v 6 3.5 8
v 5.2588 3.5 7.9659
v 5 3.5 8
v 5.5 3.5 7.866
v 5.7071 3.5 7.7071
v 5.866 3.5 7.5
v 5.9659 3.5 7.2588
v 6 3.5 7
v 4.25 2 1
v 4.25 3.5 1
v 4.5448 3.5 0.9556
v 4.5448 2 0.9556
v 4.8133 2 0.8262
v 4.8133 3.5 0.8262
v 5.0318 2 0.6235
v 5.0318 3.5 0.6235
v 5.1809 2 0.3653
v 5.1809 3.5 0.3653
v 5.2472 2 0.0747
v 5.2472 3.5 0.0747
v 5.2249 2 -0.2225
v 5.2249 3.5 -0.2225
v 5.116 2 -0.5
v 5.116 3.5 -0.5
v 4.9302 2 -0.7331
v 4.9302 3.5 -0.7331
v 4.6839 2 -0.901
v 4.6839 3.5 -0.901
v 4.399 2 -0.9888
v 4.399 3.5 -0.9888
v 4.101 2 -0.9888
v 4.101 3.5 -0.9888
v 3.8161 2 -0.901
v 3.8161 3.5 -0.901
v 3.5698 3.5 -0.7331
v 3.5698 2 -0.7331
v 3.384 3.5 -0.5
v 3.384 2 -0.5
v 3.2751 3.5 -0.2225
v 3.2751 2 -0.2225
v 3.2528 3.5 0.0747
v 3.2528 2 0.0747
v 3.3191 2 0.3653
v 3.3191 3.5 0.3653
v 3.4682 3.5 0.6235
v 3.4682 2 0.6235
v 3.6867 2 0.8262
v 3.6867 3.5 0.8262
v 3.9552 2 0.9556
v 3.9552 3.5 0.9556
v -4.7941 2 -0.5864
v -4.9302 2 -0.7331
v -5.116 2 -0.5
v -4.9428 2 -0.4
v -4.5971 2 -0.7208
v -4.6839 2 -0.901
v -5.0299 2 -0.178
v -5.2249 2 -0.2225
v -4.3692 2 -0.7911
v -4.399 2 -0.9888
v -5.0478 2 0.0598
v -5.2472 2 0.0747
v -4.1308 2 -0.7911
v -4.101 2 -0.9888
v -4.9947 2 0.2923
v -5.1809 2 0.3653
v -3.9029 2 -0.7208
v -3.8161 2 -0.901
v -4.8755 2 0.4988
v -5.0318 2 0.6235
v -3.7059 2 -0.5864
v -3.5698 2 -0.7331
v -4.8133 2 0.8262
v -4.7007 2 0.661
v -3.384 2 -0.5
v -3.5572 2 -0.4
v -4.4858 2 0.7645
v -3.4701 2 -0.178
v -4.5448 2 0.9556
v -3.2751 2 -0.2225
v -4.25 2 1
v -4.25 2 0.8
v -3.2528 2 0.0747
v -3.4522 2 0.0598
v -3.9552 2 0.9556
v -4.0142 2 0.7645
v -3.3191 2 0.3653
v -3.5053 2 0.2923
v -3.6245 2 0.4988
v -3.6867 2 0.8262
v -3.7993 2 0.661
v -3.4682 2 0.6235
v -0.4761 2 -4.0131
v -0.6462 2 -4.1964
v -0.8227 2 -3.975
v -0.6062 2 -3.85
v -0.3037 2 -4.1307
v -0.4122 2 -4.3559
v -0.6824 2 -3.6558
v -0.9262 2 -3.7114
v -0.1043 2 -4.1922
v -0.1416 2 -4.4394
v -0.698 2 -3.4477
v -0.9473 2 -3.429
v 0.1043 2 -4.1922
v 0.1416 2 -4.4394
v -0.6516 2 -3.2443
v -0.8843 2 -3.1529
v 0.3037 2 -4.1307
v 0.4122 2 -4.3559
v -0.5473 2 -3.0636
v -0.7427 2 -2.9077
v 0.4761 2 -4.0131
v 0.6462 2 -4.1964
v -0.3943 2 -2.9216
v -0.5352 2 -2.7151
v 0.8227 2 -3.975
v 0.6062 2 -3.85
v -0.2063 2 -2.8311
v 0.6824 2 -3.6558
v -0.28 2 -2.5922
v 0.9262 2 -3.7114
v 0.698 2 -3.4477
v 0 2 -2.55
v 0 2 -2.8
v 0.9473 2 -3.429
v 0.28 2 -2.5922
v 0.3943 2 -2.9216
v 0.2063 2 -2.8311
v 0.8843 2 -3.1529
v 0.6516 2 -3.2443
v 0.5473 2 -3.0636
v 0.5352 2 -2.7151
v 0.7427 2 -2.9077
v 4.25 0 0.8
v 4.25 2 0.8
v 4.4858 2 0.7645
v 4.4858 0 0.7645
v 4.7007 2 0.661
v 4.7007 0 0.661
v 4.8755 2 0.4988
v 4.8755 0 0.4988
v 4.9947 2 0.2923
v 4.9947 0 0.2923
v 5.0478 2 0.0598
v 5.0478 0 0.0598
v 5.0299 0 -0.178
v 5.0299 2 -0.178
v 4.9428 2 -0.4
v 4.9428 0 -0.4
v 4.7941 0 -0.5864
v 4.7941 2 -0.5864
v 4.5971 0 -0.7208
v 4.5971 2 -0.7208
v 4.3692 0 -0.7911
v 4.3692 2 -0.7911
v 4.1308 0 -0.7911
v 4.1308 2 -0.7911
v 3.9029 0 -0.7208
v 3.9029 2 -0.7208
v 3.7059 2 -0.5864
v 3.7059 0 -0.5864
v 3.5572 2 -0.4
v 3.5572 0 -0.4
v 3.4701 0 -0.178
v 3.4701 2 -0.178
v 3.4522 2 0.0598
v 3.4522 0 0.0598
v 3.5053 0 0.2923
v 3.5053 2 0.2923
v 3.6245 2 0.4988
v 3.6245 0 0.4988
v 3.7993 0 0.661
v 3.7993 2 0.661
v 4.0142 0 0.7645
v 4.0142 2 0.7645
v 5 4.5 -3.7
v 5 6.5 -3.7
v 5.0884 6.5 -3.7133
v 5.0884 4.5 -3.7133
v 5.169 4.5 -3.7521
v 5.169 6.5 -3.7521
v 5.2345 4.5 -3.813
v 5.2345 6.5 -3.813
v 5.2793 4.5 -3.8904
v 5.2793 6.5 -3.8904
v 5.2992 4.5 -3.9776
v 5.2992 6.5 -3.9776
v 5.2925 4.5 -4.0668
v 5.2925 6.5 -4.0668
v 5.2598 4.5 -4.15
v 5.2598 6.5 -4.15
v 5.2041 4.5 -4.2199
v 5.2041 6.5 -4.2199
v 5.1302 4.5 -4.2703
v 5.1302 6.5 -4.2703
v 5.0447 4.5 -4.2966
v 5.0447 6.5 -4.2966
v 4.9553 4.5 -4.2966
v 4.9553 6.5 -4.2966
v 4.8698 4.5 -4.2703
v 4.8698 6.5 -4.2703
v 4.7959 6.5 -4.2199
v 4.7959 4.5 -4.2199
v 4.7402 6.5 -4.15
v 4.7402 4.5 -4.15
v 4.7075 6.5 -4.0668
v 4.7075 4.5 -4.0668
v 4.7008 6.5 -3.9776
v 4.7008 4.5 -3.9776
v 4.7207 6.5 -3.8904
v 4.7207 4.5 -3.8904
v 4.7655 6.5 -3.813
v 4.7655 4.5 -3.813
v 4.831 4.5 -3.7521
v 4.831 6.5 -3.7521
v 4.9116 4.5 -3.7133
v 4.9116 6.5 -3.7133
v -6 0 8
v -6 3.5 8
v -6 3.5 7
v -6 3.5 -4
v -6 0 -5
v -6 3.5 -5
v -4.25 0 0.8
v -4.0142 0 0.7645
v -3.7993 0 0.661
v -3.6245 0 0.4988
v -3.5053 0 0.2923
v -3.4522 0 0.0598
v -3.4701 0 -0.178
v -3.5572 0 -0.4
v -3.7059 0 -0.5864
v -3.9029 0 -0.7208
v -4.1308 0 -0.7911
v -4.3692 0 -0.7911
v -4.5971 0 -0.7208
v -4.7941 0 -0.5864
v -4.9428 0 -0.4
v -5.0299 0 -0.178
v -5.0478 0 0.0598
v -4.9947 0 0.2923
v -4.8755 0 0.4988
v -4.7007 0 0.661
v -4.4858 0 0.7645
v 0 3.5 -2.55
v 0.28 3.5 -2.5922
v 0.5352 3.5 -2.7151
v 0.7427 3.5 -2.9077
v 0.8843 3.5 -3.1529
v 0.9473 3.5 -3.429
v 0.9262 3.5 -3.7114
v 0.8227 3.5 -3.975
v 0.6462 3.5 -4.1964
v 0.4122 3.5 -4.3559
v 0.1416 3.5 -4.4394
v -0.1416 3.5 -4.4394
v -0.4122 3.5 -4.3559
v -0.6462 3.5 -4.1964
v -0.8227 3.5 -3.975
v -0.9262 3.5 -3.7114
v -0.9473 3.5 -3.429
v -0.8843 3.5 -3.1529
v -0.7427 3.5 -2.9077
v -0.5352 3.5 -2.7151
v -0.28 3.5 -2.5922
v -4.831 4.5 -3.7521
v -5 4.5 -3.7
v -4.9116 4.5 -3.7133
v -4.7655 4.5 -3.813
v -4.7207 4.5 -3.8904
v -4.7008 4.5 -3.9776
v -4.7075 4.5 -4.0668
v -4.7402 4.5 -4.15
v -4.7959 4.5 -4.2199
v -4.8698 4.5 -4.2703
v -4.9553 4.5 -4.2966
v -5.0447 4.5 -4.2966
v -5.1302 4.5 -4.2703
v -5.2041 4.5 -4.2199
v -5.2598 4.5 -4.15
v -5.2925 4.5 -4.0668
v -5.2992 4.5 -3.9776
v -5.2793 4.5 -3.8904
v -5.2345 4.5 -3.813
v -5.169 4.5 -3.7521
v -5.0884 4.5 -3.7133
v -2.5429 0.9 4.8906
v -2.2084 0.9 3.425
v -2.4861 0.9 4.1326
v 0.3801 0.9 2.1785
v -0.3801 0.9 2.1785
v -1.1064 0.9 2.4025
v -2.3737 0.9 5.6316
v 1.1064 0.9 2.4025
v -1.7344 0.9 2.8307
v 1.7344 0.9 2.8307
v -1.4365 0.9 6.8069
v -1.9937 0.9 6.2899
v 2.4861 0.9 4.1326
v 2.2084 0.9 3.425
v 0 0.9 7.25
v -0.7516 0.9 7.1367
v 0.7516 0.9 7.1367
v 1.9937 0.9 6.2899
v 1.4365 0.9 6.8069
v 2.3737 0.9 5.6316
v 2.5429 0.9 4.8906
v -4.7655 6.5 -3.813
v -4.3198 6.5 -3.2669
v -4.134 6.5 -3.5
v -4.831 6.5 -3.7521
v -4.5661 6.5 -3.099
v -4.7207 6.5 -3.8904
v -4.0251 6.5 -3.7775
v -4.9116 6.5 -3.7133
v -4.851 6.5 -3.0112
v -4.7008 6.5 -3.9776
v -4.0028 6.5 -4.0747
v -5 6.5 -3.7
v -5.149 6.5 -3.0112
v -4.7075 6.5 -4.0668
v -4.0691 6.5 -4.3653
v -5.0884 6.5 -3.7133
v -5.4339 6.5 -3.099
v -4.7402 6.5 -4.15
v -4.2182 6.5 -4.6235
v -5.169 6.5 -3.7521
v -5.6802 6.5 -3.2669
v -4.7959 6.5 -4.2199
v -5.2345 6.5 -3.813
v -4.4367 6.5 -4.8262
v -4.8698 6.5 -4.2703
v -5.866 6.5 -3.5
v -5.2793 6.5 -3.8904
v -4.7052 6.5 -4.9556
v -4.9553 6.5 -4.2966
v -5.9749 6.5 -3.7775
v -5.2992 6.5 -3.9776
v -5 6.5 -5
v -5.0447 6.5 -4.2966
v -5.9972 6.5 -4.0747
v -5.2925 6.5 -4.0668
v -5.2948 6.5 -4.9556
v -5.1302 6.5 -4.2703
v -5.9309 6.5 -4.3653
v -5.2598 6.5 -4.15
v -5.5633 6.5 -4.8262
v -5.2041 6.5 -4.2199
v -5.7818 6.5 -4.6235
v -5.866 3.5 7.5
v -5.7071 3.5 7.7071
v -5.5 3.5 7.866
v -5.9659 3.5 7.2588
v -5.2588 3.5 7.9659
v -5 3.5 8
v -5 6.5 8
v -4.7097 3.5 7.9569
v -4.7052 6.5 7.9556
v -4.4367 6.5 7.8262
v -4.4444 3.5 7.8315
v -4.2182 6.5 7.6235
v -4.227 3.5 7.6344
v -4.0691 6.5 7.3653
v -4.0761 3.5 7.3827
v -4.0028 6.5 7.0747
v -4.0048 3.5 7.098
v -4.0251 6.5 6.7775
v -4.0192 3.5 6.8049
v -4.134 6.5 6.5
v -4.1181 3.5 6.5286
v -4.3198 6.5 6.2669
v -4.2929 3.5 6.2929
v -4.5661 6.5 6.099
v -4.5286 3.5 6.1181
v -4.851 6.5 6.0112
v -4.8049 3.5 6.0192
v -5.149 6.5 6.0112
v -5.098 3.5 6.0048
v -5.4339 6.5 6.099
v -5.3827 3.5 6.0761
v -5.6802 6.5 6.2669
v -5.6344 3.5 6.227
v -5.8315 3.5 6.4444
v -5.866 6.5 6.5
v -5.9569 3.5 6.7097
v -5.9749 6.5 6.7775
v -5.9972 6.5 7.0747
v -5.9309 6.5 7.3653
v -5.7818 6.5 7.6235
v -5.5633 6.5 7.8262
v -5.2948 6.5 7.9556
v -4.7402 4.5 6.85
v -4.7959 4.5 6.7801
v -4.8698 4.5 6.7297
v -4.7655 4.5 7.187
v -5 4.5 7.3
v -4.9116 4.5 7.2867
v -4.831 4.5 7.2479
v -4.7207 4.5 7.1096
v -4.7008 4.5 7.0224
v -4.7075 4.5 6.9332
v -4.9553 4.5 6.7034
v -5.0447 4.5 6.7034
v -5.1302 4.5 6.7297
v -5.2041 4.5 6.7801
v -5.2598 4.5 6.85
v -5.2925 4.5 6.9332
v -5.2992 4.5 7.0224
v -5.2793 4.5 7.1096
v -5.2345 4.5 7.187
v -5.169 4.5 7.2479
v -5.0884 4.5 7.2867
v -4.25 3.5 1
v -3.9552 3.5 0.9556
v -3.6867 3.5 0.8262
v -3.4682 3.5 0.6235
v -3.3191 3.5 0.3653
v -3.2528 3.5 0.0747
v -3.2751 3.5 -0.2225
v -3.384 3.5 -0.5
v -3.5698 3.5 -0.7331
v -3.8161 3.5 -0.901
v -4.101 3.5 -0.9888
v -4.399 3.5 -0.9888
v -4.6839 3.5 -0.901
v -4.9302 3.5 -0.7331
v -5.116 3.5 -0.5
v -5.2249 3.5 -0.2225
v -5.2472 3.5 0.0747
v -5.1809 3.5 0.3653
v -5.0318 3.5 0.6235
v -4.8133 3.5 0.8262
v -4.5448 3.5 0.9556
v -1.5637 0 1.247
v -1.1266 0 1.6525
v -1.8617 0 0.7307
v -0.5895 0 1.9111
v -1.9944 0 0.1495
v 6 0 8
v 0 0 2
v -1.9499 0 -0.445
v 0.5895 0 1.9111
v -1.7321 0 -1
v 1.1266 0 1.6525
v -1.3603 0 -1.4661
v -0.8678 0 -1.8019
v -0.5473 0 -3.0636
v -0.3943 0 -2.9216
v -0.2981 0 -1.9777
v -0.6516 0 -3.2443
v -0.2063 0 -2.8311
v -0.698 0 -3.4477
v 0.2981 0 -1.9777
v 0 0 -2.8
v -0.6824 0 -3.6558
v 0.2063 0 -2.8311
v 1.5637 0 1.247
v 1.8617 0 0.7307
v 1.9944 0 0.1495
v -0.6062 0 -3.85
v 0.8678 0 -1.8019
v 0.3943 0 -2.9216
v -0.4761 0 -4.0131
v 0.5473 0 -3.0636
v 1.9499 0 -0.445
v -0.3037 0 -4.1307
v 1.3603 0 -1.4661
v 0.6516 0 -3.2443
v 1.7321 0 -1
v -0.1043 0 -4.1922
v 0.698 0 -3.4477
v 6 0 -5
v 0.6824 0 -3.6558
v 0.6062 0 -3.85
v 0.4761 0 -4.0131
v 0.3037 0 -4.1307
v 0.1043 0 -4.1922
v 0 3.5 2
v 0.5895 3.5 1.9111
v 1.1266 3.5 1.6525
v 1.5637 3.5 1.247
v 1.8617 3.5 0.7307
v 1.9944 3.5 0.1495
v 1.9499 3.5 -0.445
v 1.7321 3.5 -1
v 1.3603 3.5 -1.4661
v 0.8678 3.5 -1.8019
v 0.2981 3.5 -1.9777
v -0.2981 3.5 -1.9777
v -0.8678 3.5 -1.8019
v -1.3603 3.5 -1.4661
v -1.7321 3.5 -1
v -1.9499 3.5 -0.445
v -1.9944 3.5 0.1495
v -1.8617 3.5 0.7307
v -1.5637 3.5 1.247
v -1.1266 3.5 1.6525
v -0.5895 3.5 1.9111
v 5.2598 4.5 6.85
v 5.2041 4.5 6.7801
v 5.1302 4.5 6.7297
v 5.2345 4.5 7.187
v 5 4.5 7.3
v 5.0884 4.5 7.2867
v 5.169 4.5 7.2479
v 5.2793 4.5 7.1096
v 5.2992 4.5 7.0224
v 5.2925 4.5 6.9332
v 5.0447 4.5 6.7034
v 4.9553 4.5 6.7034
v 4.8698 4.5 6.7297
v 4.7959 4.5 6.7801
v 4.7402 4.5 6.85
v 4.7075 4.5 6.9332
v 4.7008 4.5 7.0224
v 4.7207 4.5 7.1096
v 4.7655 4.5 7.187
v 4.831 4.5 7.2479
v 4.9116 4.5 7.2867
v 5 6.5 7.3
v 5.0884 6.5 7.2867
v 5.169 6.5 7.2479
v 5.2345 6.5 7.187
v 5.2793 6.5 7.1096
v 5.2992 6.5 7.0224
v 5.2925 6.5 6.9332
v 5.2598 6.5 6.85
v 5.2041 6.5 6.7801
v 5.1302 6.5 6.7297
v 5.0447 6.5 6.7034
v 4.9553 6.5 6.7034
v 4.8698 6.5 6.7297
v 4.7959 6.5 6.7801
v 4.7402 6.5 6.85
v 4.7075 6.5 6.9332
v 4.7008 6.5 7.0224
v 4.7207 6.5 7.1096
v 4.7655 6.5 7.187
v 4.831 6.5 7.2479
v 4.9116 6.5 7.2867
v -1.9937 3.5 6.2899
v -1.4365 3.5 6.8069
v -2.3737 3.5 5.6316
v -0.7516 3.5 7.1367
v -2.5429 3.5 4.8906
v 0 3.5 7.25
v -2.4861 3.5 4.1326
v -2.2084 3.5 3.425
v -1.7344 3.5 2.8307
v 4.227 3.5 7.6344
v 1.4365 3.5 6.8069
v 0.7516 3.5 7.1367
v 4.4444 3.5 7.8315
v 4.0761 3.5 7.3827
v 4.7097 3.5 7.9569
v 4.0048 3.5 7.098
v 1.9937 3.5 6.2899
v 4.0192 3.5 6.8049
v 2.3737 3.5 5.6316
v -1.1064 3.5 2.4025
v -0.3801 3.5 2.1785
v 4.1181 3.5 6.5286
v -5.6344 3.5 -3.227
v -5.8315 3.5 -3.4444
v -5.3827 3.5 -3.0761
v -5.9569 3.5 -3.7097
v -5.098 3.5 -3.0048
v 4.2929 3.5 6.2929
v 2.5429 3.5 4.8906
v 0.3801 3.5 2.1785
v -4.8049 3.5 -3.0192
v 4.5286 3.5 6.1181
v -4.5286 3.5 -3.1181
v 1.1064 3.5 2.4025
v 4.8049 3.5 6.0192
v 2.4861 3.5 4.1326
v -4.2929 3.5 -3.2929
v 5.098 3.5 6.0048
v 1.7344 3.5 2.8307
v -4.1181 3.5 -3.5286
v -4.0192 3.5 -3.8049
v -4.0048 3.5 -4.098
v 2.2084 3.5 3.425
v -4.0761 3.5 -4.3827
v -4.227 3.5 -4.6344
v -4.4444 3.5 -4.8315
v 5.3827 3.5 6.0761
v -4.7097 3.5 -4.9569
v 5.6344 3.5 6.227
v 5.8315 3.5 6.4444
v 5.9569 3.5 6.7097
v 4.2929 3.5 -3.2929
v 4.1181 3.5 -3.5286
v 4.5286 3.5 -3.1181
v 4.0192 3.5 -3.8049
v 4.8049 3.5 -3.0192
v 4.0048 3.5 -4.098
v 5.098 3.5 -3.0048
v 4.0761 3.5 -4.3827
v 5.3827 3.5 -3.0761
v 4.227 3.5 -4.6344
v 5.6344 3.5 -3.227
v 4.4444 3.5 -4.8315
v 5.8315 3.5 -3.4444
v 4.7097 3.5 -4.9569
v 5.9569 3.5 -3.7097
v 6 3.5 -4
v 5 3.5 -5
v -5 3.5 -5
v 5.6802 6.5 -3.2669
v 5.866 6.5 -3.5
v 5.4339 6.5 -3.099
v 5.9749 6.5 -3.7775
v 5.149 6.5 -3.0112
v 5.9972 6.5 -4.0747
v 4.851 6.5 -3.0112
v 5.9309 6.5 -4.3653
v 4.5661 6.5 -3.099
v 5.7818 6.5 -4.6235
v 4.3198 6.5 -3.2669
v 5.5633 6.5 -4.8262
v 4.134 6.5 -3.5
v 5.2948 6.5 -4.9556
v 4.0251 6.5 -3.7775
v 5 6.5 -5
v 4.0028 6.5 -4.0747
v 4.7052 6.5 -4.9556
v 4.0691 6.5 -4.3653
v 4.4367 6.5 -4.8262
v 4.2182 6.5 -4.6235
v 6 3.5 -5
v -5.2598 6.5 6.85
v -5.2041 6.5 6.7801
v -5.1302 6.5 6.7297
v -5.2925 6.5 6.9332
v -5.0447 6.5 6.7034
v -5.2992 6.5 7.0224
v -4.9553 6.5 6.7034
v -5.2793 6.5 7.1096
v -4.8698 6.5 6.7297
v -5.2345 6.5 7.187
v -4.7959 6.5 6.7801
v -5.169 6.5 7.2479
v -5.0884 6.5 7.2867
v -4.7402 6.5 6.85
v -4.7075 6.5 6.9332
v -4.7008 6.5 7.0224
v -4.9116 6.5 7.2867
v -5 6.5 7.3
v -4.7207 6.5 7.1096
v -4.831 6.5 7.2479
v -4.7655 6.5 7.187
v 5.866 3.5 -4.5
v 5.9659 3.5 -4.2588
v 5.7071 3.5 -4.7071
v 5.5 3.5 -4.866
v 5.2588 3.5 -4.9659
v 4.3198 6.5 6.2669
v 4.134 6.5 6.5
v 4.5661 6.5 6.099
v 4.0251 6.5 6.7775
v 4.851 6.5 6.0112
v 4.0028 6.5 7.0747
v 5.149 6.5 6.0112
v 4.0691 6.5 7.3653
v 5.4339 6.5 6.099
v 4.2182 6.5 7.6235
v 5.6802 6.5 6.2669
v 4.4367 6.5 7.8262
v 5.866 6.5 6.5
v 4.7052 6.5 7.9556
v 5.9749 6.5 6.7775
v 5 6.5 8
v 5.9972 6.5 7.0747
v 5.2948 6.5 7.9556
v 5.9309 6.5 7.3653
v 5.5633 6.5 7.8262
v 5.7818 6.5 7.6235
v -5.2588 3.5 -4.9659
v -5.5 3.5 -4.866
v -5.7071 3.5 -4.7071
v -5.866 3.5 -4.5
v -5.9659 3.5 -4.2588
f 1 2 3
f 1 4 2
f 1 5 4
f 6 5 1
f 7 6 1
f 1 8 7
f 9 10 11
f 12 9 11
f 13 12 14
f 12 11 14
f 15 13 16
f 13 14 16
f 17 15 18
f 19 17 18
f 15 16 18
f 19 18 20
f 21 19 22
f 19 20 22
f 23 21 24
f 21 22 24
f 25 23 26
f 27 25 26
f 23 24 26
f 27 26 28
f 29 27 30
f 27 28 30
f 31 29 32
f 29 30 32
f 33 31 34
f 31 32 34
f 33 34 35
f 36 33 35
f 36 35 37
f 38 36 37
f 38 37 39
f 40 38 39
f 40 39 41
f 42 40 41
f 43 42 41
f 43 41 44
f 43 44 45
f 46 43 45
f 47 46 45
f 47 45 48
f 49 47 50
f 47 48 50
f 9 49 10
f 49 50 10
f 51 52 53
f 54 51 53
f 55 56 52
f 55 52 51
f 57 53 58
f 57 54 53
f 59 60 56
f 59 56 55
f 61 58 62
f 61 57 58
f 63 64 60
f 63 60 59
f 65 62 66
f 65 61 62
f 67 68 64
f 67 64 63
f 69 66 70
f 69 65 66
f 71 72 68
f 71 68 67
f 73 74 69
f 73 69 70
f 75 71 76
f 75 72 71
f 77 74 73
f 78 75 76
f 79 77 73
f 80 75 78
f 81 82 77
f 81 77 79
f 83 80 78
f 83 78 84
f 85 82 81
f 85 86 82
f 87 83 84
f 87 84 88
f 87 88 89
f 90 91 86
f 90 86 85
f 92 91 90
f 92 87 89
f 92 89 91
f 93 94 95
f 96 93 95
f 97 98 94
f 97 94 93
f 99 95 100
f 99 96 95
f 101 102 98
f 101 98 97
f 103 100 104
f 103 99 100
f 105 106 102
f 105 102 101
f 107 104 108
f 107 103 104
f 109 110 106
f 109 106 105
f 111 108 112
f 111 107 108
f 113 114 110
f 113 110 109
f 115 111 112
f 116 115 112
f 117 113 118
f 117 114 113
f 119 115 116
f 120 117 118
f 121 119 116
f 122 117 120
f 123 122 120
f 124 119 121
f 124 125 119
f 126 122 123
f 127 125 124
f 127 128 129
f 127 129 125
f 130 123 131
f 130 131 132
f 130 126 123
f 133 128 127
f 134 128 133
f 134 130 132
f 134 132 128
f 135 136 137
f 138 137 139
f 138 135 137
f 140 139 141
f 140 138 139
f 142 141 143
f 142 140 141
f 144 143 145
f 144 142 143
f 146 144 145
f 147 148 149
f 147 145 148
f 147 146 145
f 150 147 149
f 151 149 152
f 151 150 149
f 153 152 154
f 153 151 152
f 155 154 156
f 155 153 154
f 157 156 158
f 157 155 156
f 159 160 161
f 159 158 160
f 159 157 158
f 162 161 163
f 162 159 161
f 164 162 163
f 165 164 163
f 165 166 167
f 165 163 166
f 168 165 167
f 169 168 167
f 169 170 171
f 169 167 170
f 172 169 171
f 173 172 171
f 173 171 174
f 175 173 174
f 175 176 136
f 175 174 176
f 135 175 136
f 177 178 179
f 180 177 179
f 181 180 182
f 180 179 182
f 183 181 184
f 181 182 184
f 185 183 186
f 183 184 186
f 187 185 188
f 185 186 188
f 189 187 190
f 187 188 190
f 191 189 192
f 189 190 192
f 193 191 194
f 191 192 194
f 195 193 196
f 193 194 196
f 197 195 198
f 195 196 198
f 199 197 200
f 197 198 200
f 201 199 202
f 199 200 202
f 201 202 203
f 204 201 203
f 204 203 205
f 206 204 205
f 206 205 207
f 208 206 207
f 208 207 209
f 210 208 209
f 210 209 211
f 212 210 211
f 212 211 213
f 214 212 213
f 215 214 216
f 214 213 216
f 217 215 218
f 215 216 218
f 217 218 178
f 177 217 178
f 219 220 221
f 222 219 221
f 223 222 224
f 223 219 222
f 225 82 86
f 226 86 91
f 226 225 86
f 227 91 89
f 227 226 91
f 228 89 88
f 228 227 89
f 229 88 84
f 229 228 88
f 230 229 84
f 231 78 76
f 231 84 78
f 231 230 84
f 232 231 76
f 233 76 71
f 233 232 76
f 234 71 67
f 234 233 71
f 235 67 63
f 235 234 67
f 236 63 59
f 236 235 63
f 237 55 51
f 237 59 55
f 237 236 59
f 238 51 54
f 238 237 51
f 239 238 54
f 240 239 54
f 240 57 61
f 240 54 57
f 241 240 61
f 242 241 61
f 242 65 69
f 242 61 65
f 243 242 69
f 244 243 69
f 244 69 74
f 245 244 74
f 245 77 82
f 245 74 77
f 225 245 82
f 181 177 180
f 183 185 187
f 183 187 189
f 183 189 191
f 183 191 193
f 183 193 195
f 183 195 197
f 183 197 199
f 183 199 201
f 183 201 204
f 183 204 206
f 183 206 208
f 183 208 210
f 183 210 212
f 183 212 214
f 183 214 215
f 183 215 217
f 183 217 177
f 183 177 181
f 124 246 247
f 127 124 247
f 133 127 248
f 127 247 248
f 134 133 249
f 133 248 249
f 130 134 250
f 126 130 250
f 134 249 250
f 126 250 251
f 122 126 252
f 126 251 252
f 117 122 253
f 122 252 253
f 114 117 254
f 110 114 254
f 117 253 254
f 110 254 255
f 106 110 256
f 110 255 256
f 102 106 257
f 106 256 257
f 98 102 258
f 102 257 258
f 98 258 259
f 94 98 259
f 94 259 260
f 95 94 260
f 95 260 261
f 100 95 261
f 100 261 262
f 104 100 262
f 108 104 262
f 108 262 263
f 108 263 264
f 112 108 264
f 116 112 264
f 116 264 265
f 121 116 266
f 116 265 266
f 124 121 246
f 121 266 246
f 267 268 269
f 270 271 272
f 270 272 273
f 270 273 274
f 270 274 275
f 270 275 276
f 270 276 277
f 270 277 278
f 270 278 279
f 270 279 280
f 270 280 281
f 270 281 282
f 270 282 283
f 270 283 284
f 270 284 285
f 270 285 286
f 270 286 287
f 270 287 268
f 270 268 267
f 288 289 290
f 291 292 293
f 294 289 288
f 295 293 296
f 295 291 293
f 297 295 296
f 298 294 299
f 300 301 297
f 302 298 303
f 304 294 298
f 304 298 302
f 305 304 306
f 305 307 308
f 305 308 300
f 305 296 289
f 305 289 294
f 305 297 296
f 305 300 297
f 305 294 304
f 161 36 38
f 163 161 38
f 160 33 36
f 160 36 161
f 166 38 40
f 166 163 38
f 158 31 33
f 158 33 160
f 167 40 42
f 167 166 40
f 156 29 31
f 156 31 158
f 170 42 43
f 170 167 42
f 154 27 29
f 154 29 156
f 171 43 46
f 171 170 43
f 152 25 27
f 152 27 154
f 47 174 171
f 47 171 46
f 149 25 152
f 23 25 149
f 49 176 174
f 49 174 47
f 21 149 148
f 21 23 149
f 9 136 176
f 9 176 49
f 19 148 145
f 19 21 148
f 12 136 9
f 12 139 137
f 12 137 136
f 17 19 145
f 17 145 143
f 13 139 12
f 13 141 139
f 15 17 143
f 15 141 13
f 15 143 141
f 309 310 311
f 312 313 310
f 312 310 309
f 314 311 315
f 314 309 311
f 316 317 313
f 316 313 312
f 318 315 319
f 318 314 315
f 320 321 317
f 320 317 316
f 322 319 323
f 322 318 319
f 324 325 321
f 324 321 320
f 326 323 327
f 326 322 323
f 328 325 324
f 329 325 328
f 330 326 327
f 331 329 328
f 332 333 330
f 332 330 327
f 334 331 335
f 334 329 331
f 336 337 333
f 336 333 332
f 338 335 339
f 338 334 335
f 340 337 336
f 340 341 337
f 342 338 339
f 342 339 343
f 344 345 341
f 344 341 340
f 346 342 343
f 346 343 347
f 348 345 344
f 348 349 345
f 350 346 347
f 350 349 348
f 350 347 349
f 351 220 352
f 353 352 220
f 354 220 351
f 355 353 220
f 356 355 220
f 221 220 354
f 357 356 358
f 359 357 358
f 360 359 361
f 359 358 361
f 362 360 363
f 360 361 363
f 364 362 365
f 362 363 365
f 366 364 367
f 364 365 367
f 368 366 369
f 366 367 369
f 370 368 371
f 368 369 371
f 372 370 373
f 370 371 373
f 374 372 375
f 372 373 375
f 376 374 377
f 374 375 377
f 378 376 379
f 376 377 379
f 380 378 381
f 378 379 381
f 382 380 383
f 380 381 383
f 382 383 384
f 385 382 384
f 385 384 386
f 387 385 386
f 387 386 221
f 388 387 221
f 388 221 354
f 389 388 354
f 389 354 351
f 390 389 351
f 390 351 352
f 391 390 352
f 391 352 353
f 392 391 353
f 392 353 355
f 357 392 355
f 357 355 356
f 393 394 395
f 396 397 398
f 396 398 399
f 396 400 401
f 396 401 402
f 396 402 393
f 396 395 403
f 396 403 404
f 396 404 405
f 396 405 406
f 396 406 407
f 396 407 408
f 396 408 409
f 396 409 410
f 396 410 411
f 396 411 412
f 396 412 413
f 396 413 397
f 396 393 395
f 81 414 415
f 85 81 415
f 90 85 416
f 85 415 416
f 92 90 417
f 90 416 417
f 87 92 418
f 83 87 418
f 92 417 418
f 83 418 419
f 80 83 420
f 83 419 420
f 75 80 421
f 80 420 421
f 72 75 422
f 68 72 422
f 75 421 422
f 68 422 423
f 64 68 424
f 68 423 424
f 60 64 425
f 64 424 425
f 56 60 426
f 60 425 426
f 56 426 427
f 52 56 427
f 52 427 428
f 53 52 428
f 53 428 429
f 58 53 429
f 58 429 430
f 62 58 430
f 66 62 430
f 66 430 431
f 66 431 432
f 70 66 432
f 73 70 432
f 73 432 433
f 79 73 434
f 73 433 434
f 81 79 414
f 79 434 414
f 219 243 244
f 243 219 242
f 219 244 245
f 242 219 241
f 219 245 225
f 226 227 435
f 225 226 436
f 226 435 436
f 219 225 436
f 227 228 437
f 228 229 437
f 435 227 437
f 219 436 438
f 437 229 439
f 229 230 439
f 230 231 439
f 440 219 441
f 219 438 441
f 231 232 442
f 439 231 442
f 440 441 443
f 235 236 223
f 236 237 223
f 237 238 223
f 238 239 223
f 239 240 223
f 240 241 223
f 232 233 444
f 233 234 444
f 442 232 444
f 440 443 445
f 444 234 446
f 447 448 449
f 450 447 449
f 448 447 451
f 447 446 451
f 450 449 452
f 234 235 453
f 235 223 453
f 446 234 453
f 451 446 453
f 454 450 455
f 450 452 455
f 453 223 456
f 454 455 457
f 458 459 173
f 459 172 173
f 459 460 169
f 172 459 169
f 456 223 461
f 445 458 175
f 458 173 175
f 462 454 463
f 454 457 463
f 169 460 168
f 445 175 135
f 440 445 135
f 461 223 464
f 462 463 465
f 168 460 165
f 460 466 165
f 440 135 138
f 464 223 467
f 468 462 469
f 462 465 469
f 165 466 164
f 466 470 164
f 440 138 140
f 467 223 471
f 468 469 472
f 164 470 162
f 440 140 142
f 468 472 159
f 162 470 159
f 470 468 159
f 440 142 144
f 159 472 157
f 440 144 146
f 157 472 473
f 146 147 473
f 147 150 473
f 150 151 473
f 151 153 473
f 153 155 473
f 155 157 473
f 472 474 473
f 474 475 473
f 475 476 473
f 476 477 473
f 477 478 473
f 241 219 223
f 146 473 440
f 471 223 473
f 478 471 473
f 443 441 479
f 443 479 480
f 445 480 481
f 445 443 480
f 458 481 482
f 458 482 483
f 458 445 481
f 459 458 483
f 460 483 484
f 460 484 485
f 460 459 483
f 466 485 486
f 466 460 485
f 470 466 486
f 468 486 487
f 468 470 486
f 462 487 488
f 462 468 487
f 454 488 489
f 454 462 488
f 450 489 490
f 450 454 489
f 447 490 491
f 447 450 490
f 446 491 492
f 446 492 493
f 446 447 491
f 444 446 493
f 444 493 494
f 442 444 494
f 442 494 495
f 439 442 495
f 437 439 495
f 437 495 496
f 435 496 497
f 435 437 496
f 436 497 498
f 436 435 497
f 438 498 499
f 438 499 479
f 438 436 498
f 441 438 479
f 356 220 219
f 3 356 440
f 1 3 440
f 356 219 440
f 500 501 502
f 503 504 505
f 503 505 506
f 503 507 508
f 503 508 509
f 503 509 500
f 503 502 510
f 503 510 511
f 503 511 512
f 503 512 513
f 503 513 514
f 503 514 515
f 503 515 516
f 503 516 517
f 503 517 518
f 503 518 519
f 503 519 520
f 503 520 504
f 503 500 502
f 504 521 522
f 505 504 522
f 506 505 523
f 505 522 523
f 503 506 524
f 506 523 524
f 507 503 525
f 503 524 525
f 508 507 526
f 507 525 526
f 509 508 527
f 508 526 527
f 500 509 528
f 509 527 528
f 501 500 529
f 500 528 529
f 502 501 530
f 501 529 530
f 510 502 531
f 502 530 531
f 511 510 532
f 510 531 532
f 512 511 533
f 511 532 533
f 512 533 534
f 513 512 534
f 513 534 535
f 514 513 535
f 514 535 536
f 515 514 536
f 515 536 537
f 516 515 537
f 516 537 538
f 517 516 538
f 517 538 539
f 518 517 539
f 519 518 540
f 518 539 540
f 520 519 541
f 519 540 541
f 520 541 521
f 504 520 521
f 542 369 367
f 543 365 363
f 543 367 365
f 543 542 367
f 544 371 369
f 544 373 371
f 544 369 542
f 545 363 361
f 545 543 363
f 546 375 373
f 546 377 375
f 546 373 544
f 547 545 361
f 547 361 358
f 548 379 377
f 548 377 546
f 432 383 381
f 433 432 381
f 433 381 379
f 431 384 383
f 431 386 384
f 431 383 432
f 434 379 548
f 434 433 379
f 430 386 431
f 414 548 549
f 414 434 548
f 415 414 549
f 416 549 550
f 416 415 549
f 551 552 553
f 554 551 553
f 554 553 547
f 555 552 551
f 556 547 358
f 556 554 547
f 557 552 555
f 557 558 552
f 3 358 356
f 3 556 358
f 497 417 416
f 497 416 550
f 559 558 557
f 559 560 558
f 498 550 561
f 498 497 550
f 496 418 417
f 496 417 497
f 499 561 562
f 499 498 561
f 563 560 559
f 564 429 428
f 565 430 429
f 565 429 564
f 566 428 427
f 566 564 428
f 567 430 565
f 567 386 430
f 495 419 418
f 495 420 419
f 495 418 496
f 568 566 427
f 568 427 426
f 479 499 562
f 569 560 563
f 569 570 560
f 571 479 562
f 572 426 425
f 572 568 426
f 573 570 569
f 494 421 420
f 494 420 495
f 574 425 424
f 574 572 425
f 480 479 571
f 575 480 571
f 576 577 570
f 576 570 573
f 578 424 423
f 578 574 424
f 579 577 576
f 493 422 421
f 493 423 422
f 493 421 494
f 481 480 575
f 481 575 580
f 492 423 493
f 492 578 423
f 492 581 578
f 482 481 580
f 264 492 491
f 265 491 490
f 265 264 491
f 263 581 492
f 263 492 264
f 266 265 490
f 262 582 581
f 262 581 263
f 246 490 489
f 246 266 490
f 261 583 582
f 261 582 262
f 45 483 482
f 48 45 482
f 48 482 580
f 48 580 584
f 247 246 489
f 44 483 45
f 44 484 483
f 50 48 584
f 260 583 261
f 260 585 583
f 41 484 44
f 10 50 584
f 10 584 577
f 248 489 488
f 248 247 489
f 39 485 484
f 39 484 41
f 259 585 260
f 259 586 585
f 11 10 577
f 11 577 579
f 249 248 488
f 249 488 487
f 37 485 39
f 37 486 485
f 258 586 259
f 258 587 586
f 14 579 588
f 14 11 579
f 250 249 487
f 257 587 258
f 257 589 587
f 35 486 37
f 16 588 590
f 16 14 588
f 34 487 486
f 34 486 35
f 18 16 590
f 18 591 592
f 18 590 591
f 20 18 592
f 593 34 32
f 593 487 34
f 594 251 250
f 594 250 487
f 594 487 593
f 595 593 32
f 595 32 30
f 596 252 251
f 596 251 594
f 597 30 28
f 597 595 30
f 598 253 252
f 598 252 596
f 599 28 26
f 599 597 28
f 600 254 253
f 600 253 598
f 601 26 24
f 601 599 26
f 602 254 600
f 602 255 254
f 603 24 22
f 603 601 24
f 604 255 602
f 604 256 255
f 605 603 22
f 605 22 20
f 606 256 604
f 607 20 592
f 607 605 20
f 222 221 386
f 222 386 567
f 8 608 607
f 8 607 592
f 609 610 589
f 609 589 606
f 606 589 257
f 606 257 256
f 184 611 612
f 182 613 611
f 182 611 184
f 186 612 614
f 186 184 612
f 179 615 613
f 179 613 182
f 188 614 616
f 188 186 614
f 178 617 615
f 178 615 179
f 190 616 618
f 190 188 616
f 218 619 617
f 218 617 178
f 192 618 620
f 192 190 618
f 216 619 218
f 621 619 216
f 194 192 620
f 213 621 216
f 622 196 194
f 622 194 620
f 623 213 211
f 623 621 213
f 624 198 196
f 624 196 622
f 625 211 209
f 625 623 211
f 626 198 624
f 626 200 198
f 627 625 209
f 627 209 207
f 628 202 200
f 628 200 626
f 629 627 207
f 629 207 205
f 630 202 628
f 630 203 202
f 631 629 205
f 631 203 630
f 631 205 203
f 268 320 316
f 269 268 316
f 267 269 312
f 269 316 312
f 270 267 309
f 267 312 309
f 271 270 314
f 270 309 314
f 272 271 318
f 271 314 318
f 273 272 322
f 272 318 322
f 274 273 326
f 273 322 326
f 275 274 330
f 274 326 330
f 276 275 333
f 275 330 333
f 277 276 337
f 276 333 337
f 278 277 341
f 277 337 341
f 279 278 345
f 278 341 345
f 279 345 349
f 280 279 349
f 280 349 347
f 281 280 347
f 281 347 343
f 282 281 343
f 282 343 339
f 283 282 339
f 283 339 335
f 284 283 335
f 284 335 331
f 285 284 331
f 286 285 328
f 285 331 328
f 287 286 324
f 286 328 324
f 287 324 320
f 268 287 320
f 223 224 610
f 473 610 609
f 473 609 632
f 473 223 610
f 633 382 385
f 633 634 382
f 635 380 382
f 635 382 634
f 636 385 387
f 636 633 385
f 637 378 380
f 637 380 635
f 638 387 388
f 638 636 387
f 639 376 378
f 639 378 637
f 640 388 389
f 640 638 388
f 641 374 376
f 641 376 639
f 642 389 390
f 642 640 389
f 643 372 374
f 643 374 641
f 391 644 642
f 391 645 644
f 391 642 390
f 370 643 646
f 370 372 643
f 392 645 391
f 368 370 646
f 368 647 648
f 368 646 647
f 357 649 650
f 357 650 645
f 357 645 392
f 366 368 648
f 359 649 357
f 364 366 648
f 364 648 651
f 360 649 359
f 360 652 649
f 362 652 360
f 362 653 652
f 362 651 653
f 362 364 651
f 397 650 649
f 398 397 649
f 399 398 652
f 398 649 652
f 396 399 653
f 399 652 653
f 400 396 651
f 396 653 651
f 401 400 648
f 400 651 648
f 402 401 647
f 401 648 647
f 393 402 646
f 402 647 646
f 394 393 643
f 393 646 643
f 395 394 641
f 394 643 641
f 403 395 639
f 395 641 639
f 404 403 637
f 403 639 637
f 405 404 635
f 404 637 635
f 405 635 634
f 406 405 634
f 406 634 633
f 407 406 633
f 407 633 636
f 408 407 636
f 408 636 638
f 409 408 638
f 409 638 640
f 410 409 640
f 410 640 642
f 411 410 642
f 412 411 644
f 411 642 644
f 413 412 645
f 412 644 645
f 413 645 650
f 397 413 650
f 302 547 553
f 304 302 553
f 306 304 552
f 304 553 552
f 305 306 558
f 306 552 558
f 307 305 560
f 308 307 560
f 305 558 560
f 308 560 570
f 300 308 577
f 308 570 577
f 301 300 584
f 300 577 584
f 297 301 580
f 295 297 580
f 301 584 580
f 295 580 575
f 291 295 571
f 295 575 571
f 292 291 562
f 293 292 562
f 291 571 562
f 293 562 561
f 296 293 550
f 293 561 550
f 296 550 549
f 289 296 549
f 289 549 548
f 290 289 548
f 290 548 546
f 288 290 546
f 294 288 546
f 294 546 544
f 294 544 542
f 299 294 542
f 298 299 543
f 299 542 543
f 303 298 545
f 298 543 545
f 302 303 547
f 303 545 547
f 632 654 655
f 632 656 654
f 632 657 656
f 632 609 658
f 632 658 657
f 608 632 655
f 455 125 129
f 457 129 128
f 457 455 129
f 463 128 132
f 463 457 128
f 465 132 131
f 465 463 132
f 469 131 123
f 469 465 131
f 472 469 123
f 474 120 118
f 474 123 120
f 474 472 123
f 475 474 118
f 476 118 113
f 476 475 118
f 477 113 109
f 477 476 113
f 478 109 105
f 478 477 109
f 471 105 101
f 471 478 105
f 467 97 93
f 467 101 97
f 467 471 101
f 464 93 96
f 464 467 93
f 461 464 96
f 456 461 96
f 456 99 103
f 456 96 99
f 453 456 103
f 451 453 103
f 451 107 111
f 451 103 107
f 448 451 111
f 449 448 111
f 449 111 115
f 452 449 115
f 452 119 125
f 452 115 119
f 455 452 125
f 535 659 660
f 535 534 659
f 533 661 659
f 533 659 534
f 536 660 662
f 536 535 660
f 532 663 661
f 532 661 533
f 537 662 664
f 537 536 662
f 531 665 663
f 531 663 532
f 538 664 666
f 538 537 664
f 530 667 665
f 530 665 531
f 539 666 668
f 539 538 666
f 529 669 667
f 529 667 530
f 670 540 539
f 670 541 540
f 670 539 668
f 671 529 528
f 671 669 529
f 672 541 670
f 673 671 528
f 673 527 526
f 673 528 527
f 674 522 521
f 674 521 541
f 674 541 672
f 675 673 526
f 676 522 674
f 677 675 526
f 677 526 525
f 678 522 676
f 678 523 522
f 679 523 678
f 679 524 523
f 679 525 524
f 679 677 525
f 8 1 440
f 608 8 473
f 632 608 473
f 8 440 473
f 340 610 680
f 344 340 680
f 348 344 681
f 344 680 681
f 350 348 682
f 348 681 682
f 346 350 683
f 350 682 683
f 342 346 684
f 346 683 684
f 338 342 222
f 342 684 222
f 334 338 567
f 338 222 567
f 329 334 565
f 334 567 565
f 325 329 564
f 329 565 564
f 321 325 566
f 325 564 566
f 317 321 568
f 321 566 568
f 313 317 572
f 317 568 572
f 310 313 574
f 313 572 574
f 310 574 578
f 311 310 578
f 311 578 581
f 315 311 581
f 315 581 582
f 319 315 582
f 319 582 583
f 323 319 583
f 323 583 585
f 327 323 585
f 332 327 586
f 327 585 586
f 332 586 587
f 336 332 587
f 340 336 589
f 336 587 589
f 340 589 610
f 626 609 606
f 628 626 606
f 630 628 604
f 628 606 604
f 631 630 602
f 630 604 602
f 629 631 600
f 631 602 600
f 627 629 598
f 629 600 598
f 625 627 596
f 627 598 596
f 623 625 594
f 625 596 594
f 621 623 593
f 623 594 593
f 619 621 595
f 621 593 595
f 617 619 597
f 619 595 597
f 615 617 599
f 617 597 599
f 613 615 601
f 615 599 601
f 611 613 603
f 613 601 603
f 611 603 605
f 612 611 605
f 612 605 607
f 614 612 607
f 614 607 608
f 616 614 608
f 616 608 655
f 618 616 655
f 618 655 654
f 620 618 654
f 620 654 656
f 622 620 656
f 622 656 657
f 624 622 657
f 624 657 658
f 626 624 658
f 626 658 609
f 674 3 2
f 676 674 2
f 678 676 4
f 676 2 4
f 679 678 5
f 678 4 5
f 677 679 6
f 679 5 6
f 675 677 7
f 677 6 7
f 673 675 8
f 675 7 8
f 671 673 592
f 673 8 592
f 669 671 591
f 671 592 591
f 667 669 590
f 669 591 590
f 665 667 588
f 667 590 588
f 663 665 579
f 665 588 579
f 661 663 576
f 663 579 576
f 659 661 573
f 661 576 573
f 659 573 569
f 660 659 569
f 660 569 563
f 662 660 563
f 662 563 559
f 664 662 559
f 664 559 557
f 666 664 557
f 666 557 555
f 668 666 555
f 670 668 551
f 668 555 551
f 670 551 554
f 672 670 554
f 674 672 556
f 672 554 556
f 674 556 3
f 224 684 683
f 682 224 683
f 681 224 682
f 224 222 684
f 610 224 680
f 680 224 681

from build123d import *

# Parameters (mm, degrees)
SKETCH_1_W          = 12
SKETCH_1_H          = 13
SKETCH_1_R          = 2
SKETCH_1_R_2        = 0.8
SKETCH_1_R_3        = 0.7
EXTRUDE_1_DEPTH     = 3.5
CUT_EXTRUDE_START   = 3.5
SKETCH_1_3_R        = 1
SKETCH_1_3_R_2      = 0.95
CUT_EXTRUDE_2_DEPTH = 1.5
SKETCH_2_R          = 2.55
CUT_EXTRUDE_5_DEPTH = 2.6
SKETCH_3_R          = 1
EXTRUDE_2_DEPTH     = 3
CUT_EXTRUDE_START_2 = 3
SKETCH_3_3_R        = 0.3
CUT_EXTRUDE_6_DEPTH = 2


with BuildPart() as part:
    # 草图1 → 凸台-拉伸1 (new body)
    with BuildSketch(Plane(origin=(0, 0, 0), x_dir=(1, 0, 0), z_dir=(0, 1, 0))):
        with Locations((0, -1.5)):
            Rectangle(SKETCH_1_W, SKETCH_1_H)
        with Locations(Location((0, 0, 0), (0, 0, 270))):
            Circle(SKETCH_1_R, mode=Mode.SUBTRACT)
        with Locations(Location((-4.25, 0, 0), (0, 0, 270))):
            Circle(SKETCH_1_R_2, mode=Mode.SUBTRACT)
        with Locations(Location((4.25, 0, 0), (0, 0, 270))):
            Circle(SKETCH_1_R_2, mode=Mode.SUBTRACT)
        with Locations(Location((0, 3.5, 0), (0, 0, 270))):
            Circle(SKETCH_1_R_3, mode=Mode.SUBTRACT)
    extrude(amount=EXTRUDE_1_DEPTH)

    # 草图1<3> → 切除-拉伸2 (cut)
    with BuildSketch(Plane(origin=(0, 0, 0), x_dir=(1, 0, 0), z_dir=(0, 1, 0)).offset(CUT_EXTRUDE_START)):
        with Locations(Location((-4.25, 0, 0), (0, 0, 270))):
            Circle(SKETCH_1_3_R)
        with Locations(Location((4.25, 0, 0), (0, 0, 270))):
            Circle(SKETCH_1_3_R)
        with Locations(Location((0, 3.5, 0), (0, 0, 270))):
            Circle(SKETCH_1_3_R_2)
    extrude(amount=-CUT_EXTRUDE_2_DEPTH, mode=Mode.SUBTRACT)

    # 草图2 → 切除-拉伸5 (cut)
    with BuildSketch(Plane(origin=(0, 3.5, 0), x_dir=(1, 0, 0), z_dir=(0, 1, 0))):
        with Locations(Location((0, -4.7, 0), (0, 0, 270))):
            Circle(SKETCH_2_R)
    extrude(amount=-CUT_EXTRUDE_5_DEPTH, mode=Mode.SUBTRACT)

    # 草图3 → 凸台-拉伸2 (add)
    with BuildSketch(Plane(origin=(0, 3.5, 0), x_dir=(1, 0, 0), z_dir=(0, 1, 0))):
        with Locations(Location((-5, -7, 0), (0, 0, 270))):
            Circle(SKETCH_3_R)
        with Locations(Location((5, 4, 0), (0, 0, 90))):
            Circle(SKETCH_3_R)
        with Locations(Location((-5, 4, 0), (0, 0, 90))):
            Circle(SKETCH_3_R)
        with Locations(Location((5, -7, 0), (0, 0, 270))):
            Circle(SKETCH_3_R)
    extrude(amount=EXTRUDE_2_DEPTH)

    # 草图3<3> → 切除-拉伸6 (cut)
    with BuildSketch(Plane(origin=(0, 3.5, 0), x_dir=(1, 0, 0), z_dir=(0, 1, 0)).offset(CUT_EXTRUDE_START_2)):
        with Locations(Location((5, 4, 0), (0, 0, 270))):
            Circle(SKETCH_3_3_R)
        with Locations(Location((-5, -7, 0), (0, 0, 270))):
            Circle(SKETCH_3_3_R)
        with Locations(Location((-5, 4, 0), (0, 0, 270))):
            Circle(SKETCH_3_3_R)
        with Locations(Location((5, -7, 0), (0, 0, 270))):
            Circle(SKETCH_3_3_R)
    extrude(amount=-CUT_EXTRUDE_6_DEPTH, mode=Mode.SUBTRACT)


solid = part.part
